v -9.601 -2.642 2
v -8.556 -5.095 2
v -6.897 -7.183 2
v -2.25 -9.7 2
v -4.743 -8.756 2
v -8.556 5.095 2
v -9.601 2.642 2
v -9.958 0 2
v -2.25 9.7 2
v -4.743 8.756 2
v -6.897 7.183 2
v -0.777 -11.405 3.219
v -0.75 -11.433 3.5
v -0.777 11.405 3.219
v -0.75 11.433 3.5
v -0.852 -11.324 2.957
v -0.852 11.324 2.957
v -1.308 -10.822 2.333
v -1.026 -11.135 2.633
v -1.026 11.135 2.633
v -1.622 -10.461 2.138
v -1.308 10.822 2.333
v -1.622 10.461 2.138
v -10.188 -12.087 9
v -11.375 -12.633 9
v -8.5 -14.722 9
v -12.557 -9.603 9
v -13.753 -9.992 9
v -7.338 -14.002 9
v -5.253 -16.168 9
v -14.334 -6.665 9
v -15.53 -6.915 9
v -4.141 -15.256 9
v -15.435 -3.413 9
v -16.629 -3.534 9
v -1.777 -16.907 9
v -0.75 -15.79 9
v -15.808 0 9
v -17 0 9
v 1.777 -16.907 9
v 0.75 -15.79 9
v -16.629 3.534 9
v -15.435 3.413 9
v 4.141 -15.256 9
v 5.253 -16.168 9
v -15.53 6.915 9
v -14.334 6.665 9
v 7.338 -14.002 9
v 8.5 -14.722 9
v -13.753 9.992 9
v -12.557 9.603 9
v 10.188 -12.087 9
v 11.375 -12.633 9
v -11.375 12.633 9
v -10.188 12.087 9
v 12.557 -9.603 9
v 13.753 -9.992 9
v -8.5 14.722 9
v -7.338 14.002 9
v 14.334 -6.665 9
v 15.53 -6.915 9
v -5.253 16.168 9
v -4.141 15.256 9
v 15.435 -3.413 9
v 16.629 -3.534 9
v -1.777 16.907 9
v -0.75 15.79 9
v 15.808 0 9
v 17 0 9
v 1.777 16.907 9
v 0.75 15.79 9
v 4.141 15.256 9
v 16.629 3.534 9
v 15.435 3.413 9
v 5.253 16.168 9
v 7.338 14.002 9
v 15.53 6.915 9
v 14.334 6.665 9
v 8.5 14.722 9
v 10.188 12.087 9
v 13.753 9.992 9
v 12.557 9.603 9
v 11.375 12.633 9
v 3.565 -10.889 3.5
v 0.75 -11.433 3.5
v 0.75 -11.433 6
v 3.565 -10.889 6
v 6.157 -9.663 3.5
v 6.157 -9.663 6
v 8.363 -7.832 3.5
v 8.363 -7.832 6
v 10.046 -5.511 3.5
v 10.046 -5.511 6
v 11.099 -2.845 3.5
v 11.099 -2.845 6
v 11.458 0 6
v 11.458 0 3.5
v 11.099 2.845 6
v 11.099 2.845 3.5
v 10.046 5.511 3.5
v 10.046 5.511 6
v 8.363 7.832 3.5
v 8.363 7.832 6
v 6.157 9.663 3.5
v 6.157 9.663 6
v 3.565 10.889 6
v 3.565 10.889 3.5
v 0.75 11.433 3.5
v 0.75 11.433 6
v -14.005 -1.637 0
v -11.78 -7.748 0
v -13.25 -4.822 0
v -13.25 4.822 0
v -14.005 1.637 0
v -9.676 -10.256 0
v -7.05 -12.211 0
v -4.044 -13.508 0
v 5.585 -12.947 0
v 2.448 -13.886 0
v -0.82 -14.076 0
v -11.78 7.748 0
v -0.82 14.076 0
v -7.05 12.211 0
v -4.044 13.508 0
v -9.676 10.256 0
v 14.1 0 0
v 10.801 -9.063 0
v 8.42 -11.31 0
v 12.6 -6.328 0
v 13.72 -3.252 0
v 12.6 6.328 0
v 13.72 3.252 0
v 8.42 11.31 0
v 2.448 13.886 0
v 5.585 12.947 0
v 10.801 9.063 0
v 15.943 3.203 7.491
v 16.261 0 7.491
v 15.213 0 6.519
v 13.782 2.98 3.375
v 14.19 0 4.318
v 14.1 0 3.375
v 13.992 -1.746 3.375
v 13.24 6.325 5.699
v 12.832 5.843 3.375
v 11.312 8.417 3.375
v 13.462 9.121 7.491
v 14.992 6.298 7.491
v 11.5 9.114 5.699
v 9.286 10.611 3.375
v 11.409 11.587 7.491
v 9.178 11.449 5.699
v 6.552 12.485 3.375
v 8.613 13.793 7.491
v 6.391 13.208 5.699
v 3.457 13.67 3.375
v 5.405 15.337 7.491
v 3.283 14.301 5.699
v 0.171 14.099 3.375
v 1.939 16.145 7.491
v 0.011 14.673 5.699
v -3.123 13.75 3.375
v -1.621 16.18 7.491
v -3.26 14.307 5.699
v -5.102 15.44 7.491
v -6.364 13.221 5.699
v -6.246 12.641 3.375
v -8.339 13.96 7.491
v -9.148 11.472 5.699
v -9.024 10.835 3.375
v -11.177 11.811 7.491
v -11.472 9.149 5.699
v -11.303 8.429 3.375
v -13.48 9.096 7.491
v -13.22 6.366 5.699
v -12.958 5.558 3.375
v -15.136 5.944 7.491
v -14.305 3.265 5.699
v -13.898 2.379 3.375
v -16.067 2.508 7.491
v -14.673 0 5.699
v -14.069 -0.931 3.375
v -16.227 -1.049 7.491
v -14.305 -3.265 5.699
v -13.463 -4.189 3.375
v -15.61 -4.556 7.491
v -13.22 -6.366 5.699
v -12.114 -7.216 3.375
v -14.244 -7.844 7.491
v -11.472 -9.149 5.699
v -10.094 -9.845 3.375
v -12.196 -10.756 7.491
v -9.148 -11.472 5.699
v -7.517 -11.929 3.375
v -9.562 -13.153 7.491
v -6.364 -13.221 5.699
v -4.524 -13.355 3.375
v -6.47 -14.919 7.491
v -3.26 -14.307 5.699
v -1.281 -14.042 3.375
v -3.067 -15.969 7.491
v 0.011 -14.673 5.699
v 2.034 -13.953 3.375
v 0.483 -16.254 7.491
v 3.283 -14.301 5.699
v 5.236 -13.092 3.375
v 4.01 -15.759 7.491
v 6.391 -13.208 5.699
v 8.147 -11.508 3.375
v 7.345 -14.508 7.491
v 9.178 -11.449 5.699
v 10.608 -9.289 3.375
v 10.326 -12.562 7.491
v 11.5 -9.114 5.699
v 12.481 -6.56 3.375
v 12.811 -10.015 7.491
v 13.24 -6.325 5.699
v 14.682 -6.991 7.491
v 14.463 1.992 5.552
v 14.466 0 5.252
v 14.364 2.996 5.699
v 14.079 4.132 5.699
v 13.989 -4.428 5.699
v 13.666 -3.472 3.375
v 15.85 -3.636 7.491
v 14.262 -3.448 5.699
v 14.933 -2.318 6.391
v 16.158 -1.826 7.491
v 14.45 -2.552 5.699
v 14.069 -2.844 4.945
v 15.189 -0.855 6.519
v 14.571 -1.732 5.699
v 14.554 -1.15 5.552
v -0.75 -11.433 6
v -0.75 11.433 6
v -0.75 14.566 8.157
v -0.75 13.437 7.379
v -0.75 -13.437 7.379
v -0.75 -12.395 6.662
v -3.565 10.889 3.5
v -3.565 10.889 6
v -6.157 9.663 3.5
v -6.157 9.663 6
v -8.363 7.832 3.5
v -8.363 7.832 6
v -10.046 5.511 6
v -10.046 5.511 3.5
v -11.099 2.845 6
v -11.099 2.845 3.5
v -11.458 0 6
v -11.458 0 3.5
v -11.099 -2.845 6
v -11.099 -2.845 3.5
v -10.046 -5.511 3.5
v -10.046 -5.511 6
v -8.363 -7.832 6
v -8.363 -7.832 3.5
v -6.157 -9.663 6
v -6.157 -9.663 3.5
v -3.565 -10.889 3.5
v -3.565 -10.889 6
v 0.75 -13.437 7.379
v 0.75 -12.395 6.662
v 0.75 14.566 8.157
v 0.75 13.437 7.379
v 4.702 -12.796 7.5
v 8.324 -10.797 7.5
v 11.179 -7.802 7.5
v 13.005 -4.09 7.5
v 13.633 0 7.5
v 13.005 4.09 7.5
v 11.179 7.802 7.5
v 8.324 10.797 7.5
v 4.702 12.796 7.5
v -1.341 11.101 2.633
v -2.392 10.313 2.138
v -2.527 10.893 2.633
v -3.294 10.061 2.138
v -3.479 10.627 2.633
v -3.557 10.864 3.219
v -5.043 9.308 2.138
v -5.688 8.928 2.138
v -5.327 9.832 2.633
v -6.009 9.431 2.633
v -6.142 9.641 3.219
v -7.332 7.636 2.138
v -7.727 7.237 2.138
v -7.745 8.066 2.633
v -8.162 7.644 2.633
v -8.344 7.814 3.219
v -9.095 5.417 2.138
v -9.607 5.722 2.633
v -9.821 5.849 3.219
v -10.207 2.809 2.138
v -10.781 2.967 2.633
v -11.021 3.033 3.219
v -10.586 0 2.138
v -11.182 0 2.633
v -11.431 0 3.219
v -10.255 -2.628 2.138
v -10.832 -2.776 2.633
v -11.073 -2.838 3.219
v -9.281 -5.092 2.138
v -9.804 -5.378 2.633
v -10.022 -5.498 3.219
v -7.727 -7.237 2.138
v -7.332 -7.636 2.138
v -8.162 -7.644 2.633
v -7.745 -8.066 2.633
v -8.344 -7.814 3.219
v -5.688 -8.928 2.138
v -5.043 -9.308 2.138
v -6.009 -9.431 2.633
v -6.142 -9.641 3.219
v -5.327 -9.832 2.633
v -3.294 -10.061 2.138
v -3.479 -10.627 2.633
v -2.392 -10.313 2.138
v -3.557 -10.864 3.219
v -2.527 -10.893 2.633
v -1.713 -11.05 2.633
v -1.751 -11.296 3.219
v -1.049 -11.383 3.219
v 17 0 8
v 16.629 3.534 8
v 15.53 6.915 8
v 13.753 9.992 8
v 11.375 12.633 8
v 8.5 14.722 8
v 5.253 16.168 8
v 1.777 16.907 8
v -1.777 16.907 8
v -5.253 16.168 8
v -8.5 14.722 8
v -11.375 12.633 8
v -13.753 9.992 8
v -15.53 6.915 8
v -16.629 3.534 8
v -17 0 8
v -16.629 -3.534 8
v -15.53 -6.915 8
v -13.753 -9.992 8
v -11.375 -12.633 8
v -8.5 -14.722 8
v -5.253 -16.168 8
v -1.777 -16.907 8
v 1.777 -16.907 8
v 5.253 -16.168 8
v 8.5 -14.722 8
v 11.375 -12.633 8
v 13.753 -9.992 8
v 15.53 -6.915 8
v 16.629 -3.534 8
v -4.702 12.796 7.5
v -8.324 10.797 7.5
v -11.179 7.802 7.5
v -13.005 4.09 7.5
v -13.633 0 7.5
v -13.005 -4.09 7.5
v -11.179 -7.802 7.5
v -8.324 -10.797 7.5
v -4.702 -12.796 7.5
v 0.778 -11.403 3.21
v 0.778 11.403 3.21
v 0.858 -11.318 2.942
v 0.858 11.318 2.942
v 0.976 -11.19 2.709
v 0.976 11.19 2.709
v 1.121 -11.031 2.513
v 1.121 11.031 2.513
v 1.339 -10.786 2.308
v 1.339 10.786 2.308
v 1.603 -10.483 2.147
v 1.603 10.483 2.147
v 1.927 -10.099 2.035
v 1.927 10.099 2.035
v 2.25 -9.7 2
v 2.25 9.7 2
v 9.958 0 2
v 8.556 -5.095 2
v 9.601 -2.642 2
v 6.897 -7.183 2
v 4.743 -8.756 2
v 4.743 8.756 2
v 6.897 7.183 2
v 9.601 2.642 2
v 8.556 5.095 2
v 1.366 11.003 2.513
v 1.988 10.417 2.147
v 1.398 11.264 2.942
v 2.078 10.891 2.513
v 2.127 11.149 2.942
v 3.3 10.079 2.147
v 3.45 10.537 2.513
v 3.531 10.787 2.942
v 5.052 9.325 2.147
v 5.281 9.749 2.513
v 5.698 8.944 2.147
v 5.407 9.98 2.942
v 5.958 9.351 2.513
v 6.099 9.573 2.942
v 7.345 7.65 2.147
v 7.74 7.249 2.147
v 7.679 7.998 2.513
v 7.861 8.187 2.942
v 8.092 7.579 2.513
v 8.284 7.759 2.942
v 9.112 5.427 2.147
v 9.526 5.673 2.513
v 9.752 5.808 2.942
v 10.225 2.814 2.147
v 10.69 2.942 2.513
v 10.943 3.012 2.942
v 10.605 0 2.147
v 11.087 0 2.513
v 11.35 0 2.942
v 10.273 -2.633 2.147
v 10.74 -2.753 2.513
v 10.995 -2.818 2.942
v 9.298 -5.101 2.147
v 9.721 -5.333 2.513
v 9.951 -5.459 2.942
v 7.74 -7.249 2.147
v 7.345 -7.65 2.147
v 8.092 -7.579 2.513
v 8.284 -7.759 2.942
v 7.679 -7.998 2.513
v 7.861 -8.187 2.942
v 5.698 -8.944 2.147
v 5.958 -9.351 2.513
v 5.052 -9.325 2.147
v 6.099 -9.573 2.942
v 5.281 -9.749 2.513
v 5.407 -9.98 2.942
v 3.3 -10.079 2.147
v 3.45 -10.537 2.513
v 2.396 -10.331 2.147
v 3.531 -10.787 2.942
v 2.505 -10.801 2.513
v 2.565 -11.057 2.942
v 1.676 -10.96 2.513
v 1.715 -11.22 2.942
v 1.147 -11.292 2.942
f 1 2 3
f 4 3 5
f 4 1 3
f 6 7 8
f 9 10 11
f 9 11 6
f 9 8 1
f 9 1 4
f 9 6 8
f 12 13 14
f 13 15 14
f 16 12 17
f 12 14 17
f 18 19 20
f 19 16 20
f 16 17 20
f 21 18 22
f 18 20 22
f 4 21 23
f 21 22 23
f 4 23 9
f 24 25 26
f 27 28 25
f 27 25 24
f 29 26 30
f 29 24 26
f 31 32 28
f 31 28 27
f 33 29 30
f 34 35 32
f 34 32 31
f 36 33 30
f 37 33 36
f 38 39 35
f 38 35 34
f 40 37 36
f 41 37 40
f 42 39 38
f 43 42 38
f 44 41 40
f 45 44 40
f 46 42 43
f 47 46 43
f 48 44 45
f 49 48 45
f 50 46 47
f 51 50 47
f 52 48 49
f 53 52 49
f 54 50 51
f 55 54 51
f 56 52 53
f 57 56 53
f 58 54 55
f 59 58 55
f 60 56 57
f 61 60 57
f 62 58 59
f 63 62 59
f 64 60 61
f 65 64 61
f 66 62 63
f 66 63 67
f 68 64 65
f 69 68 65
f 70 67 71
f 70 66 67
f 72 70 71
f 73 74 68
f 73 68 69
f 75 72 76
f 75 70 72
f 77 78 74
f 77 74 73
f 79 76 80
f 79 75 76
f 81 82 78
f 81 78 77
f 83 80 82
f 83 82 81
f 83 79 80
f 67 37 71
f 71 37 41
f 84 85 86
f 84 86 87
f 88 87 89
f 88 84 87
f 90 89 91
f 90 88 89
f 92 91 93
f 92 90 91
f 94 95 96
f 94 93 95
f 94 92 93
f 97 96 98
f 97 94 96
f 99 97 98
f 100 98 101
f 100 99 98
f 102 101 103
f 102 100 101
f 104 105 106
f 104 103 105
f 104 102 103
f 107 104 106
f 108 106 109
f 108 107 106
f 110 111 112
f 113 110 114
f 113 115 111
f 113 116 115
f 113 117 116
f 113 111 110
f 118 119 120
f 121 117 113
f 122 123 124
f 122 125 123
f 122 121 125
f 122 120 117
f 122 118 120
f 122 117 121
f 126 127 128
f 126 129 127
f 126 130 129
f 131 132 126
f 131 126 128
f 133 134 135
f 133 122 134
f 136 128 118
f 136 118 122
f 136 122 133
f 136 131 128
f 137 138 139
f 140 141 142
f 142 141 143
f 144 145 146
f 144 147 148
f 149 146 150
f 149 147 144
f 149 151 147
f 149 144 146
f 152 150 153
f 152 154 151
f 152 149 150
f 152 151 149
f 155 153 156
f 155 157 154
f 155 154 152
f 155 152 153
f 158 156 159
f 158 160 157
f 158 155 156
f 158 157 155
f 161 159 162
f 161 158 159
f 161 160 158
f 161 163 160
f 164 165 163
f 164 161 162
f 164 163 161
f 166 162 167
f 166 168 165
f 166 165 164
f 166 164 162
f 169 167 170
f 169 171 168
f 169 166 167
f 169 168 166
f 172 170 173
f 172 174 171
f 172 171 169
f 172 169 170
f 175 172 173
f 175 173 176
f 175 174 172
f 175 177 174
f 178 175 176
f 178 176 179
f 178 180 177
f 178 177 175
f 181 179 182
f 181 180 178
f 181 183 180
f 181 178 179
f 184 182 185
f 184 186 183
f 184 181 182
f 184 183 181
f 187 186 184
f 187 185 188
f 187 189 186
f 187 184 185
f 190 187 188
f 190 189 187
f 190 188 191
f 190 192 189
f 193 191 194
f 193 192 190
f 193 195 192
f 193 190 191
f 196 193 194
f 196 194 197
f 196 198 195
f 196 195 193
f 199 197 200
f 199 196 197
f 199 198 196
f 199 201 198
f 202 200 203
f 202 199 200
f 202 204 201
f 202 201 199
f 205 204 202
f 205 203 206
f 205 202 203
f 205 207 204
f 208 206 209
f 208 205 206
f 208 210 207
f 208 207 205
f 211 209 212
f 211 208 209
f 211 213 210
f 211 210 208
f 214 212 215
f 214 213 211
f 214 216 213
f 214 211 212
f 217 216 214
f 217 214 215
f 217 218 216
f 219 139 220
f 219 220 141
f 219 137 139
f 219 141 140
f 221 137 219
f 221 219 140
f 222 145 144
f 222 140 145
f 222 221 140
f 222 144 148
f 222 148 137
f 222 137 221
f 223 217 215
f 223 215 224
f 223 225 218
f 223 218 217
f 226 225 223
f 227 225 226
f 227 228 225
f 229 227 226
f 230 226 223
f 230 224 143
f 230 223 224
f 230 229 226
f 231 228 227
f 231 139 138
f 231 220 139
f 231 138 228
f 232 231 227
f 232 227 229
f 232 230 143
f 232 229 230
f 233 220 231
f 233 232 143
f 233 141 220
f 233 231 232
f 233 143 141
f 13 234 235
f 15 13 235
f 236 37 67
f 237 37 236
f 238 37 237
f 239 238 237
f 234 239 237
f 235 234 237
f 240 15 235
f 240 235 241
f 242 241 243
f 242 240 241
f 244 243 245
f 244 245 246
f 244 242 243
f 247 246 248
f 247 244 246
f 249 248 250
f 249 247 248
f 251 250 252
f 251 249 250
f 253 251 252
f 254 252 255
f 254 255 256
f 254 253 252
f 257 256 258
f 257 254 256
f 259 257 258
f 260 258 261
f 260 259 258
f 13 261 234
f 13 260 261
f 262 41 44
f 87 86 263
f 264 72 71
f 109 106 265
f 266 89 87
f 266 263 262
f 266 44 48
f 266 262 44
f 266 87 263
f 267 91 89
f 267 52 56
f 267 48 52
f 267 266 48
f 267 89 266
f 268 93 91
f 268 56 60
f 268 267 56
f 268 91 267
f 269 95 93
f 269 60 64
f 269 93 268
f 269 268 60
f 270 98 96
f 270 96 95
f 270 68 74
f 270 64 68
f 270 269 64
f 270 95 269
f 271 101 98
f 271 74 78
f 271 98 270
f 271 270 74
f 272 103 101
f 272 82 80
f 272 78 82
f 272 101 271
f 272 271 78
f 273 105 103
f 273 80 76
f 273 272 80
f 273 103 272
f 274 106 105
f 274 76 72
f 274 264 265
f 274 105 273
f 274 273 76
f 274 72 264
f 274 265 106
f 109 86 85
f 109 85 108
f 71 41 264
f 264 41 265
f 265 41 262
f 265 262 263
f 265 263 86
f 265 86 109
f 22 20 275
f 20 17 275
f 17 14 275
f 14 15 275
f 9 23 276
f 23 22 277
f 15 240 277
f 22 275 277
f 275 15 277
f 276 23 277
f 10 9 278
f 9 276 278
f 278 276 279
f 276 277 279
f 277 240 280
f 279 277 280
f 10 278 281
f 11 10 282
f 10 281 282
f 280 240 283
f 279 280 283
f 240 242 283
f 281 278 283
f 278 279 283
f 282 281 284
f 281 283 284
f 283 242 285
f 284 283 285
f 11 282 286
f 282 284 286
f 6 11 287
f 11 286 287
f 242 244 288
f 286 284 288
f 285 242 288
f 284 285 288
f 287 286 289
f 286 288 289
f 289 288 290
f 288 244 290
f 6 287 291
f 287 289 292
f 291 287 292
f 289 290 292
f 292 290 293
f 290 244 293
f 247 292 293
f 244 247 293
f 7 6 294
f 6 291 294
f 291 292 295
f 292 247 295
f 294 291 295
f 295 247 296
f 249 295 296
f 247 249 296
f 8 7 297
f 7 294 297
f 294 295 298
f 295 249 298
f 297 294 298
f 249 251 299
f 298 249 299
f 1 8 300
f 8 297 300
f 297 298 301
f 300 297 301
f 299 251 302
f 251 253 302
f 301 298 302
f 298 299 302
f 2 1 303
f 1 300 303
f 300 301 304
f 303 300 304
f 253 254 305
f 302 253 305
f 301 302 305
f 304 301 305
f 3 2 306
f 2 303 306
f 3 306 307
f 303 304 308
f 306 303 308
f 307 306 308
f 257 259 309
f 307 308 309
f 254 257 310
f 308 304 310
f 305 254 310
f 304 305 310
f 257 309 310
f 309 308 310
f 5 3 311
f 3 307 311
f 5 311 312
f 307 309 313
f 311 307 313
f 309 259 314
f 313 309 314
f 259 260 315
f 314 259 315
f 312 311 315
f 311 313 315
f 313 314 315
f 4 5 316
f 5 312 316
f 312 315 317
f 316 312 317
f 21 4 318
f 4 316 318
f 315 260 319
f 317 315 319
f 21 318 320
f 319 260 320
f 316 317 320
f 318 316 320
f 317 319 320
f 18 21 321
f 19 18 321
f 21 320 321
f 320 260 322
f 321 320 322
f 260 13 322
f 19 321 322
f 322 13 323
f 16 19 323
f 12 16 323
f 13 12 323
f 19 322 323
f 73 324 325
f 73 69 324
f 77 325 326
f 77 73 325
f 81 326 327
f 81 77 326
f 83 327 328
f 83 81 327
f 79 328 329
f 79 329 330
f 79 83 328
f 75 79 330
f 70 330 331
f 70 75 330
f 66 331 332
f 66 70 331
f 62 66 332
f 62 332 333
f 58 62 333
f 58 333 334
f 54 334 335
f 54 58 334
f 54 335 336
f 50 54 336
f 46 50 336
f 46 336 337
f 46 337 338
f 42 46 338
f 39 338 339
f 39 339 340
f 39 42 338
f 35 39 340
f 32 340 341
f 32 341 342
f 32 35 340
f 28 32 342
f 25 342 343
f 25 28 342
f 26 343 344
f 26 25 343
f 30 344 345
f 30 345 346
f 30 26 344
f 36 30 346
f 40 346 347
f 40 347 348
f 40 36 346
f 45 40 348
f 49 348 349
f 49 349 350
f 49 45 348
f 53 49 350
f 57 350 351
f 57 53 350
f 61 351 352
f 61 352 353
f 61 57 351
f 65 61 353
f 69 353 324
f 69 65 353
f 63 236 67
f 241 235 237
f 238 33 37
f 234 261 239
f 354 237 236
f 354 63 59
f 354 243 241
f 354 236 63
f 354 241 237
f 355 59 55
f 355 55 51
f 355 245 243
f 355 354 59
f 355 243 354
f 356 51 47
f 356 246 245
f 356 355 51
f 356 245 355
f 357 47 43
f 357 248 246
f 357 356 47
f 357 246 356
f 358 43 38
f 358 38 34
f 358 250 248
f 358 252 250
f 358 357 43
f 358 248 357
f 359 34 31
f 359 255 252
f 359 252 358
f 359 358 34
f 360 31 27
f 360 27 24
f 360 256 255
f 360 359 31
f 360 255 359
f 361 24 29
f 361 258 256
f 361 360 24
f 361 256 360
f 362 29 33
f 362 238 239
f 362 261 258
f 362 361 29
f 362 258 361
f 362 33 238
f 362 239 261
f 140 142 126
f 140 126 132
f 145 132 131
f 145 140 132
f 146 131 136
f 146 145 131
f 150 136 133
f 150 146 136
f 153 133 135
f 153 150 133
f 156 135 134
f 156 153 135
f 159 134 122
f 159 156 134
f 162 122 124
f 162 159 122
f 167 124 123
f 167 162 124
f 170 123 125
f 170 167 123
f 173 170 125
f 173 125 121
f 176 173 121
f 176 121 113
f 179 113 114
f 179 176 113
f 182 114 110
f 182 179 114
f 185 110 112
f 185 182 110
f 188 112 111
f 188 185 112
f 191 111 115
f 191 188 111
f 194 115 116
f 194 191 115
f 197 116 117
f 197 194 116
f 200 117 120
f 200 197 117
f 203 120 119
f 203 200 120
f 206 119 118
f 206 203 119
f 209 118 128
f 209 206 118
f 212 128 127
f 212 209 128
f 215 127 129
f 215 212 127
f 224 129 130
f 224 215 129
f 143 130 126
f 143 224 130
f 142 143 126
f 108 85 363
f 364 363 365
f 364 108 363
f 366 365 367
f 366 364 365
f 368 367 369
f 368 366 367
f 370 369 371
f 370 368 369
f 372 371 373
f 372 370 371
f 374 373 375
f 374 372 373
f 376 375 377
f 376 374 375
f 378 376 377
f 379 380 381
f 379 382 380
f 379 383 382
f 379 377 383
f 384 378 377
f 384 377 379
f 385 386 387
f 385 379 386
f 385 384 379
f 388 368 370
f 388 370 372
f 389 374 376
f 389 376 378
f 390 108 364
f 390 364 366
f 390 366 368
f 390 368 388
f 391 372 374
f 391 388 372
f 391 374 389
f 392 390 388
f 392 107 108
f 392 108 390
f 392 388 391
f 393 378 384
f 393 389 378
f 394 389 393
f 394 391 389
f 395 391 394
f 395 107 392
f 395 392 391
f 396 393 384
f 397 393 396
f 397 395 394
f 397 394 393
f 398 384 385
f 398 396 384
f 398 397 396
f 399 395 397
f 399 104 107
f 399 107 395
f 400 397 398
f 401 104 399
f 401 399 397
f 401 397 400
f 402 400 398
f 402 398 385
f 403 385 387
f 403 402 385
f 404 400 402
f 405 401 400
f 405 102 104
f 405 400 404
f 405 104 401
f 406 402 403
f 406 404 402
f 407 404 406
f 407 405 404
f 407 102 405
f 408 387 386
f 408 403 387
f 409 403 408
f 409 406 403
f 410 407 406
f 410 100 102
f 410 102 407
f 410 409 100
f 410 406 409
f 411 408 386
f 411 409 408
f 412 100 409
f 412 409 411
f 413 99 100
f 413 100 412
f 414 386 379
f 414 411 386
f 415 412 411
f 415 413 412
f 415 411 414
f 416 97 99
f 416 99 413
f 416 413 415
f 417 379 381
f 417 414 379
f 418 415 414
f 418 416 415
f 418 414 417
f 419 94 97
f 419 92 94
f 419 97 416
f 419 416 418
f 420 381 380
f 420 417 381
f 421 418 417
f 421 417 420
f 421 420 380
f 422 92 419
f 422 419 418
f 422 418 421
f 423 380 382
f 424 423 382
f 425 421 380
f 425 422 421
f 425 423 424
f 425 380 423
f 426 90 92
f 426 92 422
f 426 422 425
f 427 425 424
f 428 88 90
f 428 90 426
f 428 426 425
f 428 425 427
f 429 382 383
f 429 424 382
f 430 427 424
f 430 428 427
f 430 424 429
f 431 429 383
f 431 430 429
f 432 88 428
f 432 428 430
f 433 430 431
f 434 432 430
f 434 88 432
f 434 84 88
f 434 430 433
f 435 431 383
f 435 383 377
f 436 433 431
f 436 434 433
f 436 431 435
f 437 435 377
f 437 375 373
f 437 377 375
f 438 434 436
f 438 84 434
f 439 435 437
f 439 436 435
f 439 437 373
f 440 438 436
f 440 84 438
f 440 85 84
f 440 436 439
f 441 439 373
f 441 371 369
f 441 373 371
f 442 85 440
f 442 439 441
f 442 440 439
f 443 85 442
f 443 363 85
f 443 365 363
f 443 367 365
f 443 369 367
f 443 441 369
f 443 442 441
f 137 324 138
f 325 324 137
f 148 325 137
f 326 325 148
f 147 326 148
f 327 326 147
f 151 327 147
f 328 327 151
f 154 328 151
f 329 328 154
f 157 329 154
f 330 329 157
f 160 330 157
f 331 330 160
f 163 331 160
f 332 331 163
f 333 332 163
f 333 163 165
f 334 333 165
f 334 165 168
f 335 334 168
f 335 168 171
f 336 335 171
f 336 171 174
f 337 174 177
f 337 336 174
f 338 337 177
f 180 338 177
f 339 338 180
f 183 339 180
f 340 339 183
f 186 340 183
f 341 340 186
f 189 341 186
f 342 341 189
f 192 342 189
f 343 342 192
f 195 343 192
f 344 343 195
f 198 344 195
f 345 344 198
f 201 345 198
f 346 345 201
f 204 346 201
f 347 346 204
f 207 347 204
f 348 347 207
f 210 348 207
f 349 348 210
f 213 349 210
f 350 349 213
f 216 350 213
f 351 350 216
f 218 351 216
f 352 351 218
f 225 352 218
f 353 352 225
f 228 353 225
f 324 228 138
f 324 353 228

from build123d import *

# Parameters (mm, degrees)
F3_DEPTH = 0.75
F4_R     = 1.5
F5_R     = 5


with BuildPart() as f1:
    # F0 (on Front) → F1 (revolve)
    with BuildSketch(Plane.XZ):
        Polygon((0, 2), (0, 0), (14.1, 0), (14.1, 6), (17, 8), (17, 9), (15.8079127569, 9), (11.4579127569, 6), (11.4579127569, 2), align=None)
    revolve(axis=Axis((0, 0, 4.5), (0, 0, 1)))

    # F2 (on Right) → F3 (join, symmetric)
    with BuildSketch(Plane.YZ):
        Polygon((16, 9), (-16, 9), (-16, 8), (-13.1, 6), (-13.1, 0), (13.1, 0), (13.1, 6), (16, 8), align=None)
    extrude(amount=F3_DEPTH, both=True)

    # F4
    f4_edges = [f1.edges().sort_by_distance(p)[0] for p in [
        (-11.457913, 0, 2),
        (0.75, 0, 2),
        (11.457913, 0, 2),
        (-0.75, 0, 2),
    ]]
    fillet(f4_edges, radius=F4_R)

    # F5
    f5_edges = [f1.edges().sort_by_distance(p)[0] for p in [
        (-14.1, 0, 6),
    ]]
    fillet(f5_edges, radius=F5_R)


solid = f1.part
